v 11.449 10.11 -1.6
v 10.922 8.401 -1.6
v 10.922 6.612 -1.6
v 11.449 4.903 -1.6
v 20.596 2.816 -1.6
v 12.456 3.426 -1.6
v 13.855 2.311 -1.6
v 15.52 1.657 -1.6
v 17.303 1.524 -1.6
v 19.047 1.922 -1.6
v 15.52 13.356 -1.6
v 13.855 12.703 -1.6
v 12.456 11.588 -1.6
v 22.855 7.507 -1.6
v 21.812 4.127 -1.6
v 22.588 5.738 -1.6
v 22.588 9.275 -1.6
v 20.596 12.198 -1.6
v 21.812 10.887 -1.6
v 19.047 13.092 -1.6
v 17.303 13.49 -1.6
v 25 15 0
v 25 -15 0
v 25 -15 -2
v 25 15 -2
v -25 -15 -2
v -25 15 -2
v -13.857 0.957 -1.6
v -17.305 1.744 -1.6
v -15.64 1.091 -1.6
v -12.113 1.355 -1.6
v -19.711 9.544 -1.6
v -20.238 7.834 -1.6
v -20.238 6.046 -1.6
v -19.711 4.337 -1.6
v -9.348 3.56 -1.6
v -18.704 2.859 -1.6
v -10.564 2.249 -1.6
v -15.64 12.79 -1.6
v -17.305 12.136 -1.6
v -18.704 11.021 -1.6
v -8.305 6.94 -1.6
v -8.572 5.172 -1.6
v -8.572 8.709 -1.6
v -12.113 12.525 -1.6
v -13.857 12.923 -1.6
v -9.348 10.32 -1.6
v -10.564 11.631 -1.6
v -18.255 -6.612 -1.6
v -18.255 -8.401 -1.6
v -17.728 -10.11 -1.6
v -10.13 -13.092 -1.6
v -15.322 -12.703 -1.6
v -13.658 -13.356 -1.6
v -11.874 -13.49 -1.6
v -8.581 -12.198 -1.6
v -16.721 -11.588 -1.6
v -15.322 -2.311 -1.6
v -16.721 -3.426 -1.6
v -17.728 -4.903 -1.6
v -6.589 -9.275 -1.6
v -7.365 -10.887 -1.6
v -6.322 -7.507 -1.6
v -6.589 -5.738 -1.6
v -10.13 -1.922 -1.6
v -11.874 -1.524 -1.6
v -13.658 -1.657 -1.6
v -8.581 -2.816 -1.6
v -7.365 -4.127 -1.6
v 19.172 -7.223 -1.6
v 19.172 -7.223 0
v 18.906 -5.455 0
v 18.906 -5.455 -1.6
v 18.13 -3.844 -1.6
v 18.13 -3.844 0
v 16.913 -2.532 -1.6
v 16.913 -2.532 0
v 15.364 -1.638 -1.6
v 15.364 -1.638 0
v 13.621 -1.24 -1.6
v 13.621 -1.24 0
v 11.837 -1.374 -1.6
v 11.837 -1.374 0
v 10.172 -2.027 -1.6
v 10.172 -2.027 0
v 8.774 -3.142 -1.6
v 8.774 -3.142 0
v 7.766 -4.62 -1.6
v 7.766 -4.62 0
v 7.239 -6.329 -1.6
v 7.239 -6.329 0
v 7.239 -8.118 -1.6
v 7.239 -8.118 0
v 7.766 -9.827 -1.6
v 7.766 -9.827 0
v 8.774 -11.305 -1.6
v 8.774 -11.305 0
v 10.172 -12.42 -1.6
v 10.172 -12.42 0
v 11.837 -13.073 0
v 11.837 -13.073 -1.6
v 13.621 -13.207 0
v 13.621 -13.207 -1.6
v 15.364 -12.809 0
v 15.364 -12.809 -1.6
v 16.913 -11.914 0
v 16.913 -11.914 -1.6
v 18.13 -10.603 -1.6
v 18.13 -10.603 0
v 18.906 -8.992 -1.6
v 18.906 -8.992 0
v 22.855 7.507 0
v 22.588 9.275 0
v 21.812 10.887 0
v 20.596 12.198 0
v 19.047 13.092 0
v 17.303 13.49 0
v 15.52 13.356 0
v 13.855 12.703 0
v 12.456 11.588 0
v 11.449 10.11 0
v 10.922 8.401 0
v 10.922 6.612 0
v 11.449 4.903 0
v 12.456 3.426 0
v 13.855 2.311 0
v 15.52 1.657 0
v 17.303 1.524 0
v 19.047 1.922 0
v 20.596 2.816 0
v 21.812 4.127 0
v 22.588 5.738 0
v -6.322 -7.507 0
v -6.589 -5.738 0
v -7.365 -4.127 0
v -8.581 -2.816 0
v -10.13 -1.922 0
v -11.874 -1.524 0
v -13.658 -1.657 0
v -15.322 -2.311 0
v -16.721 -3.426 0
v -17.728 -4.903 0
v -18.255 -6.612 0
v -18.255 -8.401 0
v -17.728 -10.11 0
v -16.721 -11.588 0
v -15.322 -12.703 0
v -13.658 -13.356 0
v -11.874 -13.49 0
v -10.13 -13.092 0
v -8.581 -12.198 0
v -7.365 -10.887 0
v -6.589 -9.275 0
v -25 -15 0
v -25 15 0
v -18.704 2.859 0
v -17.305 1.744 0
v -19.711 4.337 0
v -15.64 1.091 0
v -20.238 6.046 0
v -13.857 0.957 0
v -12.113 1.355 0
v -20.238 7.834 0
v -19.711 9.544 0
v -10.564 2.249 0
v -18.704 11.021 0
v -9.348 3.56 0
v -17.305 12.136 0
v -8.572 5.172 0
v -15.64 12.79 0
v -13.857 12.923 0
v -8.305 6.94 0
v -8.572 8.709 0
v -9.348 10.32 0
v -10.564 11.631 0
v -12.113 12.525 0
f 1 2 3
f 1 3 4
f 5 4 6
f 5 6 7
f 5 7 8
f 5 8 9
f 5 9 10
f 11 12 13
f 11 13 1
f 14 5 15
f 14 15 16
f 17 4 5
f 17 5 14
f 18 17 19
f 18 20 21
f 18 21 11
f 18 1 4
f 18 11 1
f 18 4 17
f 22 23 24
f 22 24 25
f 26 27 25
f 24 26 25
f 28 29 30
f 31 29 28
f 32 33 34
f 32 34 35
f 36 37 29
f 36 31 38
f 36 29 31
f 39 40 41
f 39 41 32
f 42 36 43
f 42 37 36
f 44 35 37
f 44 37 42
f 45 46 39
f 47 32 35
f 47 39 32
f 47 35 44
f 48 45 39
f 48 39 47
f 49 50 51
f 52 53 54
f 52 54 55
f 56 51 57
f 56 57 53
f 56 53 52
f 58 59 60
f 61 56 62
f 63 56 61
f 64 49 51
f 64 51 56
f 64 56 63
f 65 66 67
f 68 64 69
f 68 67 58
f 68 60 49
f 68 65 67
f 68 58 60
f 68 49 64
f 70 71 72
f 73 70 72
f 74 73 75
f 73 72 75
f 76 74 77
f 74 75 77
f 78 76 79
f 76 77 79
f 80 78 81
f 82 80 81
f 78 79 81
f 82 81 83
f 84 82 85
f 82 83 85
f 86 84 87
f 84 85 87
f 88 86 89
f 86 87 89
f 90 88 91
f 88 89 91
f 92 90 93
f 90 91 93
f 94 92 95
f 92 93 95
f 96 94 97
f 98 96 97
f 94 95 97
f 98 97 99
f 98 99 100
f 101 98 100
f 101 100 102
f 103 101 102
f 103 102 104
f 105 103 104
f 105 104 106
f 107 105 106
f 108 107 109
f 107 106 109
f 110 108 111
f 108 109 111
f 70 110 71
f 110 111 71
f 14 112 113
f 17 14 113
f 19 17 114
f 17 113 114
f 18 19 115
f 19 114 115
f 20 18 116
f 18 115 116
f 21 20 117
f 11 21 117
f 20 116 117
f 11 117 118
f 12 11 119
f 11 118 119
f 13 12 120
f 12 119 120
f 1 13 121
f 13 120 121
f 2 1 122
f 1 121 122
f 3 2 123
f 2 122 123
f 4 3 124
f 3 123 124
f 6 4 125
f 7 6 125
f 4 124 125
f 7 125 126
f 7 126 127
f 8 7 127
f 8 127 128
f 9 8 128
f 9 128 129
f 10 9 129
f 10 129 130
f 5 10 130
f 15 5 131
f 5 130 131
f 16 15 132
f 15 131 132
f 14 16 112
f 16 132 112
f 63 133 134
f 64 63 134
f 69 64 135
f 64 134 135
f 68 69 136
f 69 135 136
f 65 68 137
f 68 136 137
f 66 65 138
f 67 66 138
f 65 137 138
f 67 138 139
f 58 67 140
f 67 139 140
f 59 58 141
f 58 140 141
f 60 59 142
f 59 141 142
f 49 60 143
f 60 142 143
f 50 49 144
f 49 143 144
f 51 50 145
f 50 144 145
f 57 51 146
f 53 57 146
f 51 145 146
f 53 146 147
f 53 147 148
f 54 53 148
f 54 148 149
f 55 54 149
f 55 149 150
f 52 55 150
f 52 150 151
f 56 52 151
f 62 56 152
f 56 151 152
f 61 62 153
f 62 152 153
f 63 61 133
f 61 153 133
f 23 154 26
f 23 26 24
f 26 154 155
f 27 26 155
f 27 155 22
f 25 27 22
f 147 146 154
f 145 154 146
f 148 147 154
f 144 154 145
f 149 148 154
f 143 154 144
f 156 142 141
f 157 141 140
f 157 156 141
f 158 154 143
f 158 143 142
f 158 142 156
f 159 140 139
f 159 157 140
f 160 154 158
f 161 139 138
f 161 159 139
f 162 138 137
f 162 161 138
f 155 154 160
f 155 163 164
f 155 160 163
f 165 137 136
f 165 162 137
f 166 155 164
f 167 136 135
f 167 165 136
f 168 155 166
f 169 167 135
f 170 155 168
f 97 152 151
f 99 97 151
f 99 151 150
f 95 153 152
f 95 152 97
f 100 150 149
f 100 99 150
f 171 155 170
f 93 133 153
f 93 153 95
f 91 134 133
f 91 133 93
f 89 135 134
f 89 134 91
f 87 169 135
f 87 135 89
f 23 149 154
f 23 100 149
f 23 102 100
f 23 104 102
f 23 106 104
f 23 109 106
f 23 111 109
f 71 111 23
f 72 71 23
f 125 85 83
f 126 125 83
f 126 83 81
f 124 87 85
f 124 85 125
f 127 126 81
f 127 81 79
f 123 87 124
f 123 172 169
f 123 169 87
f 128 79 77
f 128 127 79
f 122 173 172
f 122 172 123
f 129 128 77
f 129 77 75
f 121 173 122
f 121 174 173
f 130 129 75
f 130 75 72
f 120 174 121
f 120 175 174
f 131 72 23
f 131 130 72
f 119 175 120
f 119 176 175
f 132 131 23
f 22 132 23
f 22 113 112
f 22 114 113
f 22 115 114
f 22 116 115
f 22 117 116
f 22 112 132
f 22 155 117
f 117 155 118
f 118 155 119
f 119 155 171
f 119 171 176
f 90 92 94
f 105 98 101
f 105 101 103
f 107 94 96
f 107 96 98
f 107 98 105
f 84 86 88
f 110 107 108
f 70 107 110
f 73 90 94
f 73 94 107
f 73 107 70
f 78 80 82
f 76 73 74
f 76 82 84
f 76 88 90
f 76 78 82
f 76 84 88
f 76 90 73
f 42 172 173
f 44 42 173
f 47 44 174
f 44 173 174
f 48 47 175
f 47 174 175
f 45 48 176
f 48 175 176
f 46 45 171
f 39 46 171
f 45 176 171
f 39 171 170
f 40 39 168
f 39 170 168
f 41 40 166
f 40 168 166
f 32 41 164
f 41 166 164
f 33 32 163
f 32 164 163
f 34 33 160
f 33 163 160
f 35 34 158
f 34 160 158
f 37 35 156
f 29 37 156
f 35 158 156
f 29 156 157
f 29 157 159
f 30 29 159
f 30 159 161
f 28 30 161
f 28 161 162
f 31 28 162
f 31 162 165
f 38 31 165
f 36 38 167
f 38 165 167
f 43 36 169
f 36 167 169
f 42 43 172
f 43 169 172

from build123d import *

# Parameters (mm, degrees)
F0_W     = 50
F0_H     = 30
F1_DEPTH = 2
F2_R     = 6
F3_DEPTH = 1.6


with BuildPart() as f1:
    # F0 (on Top) → F1 (new body)
    with BuildSketch(Plane.XY):
        Rectangle(F0_W, F0_H)
    extrude(amount=-F1_DEPTH)

    # F2 (on Top) → F3 (cut)
    with BuildSketch(Plane.XY):
        with Locations((-14.305306, 6.940198)):
            Circle(F2_R)
        with Locations((-12.322392, -7.506745)):
            Circle(F2_R)
        with Locations((13.172213, -7.223471)):
            Circle(F2_R)
        with Locations((16.854765, 7.506745)):
            Circle(F2_R)
    extrude(amount=-F3_DEPTH, mode=Mode.SUBTRACT)


solid = f1.part
